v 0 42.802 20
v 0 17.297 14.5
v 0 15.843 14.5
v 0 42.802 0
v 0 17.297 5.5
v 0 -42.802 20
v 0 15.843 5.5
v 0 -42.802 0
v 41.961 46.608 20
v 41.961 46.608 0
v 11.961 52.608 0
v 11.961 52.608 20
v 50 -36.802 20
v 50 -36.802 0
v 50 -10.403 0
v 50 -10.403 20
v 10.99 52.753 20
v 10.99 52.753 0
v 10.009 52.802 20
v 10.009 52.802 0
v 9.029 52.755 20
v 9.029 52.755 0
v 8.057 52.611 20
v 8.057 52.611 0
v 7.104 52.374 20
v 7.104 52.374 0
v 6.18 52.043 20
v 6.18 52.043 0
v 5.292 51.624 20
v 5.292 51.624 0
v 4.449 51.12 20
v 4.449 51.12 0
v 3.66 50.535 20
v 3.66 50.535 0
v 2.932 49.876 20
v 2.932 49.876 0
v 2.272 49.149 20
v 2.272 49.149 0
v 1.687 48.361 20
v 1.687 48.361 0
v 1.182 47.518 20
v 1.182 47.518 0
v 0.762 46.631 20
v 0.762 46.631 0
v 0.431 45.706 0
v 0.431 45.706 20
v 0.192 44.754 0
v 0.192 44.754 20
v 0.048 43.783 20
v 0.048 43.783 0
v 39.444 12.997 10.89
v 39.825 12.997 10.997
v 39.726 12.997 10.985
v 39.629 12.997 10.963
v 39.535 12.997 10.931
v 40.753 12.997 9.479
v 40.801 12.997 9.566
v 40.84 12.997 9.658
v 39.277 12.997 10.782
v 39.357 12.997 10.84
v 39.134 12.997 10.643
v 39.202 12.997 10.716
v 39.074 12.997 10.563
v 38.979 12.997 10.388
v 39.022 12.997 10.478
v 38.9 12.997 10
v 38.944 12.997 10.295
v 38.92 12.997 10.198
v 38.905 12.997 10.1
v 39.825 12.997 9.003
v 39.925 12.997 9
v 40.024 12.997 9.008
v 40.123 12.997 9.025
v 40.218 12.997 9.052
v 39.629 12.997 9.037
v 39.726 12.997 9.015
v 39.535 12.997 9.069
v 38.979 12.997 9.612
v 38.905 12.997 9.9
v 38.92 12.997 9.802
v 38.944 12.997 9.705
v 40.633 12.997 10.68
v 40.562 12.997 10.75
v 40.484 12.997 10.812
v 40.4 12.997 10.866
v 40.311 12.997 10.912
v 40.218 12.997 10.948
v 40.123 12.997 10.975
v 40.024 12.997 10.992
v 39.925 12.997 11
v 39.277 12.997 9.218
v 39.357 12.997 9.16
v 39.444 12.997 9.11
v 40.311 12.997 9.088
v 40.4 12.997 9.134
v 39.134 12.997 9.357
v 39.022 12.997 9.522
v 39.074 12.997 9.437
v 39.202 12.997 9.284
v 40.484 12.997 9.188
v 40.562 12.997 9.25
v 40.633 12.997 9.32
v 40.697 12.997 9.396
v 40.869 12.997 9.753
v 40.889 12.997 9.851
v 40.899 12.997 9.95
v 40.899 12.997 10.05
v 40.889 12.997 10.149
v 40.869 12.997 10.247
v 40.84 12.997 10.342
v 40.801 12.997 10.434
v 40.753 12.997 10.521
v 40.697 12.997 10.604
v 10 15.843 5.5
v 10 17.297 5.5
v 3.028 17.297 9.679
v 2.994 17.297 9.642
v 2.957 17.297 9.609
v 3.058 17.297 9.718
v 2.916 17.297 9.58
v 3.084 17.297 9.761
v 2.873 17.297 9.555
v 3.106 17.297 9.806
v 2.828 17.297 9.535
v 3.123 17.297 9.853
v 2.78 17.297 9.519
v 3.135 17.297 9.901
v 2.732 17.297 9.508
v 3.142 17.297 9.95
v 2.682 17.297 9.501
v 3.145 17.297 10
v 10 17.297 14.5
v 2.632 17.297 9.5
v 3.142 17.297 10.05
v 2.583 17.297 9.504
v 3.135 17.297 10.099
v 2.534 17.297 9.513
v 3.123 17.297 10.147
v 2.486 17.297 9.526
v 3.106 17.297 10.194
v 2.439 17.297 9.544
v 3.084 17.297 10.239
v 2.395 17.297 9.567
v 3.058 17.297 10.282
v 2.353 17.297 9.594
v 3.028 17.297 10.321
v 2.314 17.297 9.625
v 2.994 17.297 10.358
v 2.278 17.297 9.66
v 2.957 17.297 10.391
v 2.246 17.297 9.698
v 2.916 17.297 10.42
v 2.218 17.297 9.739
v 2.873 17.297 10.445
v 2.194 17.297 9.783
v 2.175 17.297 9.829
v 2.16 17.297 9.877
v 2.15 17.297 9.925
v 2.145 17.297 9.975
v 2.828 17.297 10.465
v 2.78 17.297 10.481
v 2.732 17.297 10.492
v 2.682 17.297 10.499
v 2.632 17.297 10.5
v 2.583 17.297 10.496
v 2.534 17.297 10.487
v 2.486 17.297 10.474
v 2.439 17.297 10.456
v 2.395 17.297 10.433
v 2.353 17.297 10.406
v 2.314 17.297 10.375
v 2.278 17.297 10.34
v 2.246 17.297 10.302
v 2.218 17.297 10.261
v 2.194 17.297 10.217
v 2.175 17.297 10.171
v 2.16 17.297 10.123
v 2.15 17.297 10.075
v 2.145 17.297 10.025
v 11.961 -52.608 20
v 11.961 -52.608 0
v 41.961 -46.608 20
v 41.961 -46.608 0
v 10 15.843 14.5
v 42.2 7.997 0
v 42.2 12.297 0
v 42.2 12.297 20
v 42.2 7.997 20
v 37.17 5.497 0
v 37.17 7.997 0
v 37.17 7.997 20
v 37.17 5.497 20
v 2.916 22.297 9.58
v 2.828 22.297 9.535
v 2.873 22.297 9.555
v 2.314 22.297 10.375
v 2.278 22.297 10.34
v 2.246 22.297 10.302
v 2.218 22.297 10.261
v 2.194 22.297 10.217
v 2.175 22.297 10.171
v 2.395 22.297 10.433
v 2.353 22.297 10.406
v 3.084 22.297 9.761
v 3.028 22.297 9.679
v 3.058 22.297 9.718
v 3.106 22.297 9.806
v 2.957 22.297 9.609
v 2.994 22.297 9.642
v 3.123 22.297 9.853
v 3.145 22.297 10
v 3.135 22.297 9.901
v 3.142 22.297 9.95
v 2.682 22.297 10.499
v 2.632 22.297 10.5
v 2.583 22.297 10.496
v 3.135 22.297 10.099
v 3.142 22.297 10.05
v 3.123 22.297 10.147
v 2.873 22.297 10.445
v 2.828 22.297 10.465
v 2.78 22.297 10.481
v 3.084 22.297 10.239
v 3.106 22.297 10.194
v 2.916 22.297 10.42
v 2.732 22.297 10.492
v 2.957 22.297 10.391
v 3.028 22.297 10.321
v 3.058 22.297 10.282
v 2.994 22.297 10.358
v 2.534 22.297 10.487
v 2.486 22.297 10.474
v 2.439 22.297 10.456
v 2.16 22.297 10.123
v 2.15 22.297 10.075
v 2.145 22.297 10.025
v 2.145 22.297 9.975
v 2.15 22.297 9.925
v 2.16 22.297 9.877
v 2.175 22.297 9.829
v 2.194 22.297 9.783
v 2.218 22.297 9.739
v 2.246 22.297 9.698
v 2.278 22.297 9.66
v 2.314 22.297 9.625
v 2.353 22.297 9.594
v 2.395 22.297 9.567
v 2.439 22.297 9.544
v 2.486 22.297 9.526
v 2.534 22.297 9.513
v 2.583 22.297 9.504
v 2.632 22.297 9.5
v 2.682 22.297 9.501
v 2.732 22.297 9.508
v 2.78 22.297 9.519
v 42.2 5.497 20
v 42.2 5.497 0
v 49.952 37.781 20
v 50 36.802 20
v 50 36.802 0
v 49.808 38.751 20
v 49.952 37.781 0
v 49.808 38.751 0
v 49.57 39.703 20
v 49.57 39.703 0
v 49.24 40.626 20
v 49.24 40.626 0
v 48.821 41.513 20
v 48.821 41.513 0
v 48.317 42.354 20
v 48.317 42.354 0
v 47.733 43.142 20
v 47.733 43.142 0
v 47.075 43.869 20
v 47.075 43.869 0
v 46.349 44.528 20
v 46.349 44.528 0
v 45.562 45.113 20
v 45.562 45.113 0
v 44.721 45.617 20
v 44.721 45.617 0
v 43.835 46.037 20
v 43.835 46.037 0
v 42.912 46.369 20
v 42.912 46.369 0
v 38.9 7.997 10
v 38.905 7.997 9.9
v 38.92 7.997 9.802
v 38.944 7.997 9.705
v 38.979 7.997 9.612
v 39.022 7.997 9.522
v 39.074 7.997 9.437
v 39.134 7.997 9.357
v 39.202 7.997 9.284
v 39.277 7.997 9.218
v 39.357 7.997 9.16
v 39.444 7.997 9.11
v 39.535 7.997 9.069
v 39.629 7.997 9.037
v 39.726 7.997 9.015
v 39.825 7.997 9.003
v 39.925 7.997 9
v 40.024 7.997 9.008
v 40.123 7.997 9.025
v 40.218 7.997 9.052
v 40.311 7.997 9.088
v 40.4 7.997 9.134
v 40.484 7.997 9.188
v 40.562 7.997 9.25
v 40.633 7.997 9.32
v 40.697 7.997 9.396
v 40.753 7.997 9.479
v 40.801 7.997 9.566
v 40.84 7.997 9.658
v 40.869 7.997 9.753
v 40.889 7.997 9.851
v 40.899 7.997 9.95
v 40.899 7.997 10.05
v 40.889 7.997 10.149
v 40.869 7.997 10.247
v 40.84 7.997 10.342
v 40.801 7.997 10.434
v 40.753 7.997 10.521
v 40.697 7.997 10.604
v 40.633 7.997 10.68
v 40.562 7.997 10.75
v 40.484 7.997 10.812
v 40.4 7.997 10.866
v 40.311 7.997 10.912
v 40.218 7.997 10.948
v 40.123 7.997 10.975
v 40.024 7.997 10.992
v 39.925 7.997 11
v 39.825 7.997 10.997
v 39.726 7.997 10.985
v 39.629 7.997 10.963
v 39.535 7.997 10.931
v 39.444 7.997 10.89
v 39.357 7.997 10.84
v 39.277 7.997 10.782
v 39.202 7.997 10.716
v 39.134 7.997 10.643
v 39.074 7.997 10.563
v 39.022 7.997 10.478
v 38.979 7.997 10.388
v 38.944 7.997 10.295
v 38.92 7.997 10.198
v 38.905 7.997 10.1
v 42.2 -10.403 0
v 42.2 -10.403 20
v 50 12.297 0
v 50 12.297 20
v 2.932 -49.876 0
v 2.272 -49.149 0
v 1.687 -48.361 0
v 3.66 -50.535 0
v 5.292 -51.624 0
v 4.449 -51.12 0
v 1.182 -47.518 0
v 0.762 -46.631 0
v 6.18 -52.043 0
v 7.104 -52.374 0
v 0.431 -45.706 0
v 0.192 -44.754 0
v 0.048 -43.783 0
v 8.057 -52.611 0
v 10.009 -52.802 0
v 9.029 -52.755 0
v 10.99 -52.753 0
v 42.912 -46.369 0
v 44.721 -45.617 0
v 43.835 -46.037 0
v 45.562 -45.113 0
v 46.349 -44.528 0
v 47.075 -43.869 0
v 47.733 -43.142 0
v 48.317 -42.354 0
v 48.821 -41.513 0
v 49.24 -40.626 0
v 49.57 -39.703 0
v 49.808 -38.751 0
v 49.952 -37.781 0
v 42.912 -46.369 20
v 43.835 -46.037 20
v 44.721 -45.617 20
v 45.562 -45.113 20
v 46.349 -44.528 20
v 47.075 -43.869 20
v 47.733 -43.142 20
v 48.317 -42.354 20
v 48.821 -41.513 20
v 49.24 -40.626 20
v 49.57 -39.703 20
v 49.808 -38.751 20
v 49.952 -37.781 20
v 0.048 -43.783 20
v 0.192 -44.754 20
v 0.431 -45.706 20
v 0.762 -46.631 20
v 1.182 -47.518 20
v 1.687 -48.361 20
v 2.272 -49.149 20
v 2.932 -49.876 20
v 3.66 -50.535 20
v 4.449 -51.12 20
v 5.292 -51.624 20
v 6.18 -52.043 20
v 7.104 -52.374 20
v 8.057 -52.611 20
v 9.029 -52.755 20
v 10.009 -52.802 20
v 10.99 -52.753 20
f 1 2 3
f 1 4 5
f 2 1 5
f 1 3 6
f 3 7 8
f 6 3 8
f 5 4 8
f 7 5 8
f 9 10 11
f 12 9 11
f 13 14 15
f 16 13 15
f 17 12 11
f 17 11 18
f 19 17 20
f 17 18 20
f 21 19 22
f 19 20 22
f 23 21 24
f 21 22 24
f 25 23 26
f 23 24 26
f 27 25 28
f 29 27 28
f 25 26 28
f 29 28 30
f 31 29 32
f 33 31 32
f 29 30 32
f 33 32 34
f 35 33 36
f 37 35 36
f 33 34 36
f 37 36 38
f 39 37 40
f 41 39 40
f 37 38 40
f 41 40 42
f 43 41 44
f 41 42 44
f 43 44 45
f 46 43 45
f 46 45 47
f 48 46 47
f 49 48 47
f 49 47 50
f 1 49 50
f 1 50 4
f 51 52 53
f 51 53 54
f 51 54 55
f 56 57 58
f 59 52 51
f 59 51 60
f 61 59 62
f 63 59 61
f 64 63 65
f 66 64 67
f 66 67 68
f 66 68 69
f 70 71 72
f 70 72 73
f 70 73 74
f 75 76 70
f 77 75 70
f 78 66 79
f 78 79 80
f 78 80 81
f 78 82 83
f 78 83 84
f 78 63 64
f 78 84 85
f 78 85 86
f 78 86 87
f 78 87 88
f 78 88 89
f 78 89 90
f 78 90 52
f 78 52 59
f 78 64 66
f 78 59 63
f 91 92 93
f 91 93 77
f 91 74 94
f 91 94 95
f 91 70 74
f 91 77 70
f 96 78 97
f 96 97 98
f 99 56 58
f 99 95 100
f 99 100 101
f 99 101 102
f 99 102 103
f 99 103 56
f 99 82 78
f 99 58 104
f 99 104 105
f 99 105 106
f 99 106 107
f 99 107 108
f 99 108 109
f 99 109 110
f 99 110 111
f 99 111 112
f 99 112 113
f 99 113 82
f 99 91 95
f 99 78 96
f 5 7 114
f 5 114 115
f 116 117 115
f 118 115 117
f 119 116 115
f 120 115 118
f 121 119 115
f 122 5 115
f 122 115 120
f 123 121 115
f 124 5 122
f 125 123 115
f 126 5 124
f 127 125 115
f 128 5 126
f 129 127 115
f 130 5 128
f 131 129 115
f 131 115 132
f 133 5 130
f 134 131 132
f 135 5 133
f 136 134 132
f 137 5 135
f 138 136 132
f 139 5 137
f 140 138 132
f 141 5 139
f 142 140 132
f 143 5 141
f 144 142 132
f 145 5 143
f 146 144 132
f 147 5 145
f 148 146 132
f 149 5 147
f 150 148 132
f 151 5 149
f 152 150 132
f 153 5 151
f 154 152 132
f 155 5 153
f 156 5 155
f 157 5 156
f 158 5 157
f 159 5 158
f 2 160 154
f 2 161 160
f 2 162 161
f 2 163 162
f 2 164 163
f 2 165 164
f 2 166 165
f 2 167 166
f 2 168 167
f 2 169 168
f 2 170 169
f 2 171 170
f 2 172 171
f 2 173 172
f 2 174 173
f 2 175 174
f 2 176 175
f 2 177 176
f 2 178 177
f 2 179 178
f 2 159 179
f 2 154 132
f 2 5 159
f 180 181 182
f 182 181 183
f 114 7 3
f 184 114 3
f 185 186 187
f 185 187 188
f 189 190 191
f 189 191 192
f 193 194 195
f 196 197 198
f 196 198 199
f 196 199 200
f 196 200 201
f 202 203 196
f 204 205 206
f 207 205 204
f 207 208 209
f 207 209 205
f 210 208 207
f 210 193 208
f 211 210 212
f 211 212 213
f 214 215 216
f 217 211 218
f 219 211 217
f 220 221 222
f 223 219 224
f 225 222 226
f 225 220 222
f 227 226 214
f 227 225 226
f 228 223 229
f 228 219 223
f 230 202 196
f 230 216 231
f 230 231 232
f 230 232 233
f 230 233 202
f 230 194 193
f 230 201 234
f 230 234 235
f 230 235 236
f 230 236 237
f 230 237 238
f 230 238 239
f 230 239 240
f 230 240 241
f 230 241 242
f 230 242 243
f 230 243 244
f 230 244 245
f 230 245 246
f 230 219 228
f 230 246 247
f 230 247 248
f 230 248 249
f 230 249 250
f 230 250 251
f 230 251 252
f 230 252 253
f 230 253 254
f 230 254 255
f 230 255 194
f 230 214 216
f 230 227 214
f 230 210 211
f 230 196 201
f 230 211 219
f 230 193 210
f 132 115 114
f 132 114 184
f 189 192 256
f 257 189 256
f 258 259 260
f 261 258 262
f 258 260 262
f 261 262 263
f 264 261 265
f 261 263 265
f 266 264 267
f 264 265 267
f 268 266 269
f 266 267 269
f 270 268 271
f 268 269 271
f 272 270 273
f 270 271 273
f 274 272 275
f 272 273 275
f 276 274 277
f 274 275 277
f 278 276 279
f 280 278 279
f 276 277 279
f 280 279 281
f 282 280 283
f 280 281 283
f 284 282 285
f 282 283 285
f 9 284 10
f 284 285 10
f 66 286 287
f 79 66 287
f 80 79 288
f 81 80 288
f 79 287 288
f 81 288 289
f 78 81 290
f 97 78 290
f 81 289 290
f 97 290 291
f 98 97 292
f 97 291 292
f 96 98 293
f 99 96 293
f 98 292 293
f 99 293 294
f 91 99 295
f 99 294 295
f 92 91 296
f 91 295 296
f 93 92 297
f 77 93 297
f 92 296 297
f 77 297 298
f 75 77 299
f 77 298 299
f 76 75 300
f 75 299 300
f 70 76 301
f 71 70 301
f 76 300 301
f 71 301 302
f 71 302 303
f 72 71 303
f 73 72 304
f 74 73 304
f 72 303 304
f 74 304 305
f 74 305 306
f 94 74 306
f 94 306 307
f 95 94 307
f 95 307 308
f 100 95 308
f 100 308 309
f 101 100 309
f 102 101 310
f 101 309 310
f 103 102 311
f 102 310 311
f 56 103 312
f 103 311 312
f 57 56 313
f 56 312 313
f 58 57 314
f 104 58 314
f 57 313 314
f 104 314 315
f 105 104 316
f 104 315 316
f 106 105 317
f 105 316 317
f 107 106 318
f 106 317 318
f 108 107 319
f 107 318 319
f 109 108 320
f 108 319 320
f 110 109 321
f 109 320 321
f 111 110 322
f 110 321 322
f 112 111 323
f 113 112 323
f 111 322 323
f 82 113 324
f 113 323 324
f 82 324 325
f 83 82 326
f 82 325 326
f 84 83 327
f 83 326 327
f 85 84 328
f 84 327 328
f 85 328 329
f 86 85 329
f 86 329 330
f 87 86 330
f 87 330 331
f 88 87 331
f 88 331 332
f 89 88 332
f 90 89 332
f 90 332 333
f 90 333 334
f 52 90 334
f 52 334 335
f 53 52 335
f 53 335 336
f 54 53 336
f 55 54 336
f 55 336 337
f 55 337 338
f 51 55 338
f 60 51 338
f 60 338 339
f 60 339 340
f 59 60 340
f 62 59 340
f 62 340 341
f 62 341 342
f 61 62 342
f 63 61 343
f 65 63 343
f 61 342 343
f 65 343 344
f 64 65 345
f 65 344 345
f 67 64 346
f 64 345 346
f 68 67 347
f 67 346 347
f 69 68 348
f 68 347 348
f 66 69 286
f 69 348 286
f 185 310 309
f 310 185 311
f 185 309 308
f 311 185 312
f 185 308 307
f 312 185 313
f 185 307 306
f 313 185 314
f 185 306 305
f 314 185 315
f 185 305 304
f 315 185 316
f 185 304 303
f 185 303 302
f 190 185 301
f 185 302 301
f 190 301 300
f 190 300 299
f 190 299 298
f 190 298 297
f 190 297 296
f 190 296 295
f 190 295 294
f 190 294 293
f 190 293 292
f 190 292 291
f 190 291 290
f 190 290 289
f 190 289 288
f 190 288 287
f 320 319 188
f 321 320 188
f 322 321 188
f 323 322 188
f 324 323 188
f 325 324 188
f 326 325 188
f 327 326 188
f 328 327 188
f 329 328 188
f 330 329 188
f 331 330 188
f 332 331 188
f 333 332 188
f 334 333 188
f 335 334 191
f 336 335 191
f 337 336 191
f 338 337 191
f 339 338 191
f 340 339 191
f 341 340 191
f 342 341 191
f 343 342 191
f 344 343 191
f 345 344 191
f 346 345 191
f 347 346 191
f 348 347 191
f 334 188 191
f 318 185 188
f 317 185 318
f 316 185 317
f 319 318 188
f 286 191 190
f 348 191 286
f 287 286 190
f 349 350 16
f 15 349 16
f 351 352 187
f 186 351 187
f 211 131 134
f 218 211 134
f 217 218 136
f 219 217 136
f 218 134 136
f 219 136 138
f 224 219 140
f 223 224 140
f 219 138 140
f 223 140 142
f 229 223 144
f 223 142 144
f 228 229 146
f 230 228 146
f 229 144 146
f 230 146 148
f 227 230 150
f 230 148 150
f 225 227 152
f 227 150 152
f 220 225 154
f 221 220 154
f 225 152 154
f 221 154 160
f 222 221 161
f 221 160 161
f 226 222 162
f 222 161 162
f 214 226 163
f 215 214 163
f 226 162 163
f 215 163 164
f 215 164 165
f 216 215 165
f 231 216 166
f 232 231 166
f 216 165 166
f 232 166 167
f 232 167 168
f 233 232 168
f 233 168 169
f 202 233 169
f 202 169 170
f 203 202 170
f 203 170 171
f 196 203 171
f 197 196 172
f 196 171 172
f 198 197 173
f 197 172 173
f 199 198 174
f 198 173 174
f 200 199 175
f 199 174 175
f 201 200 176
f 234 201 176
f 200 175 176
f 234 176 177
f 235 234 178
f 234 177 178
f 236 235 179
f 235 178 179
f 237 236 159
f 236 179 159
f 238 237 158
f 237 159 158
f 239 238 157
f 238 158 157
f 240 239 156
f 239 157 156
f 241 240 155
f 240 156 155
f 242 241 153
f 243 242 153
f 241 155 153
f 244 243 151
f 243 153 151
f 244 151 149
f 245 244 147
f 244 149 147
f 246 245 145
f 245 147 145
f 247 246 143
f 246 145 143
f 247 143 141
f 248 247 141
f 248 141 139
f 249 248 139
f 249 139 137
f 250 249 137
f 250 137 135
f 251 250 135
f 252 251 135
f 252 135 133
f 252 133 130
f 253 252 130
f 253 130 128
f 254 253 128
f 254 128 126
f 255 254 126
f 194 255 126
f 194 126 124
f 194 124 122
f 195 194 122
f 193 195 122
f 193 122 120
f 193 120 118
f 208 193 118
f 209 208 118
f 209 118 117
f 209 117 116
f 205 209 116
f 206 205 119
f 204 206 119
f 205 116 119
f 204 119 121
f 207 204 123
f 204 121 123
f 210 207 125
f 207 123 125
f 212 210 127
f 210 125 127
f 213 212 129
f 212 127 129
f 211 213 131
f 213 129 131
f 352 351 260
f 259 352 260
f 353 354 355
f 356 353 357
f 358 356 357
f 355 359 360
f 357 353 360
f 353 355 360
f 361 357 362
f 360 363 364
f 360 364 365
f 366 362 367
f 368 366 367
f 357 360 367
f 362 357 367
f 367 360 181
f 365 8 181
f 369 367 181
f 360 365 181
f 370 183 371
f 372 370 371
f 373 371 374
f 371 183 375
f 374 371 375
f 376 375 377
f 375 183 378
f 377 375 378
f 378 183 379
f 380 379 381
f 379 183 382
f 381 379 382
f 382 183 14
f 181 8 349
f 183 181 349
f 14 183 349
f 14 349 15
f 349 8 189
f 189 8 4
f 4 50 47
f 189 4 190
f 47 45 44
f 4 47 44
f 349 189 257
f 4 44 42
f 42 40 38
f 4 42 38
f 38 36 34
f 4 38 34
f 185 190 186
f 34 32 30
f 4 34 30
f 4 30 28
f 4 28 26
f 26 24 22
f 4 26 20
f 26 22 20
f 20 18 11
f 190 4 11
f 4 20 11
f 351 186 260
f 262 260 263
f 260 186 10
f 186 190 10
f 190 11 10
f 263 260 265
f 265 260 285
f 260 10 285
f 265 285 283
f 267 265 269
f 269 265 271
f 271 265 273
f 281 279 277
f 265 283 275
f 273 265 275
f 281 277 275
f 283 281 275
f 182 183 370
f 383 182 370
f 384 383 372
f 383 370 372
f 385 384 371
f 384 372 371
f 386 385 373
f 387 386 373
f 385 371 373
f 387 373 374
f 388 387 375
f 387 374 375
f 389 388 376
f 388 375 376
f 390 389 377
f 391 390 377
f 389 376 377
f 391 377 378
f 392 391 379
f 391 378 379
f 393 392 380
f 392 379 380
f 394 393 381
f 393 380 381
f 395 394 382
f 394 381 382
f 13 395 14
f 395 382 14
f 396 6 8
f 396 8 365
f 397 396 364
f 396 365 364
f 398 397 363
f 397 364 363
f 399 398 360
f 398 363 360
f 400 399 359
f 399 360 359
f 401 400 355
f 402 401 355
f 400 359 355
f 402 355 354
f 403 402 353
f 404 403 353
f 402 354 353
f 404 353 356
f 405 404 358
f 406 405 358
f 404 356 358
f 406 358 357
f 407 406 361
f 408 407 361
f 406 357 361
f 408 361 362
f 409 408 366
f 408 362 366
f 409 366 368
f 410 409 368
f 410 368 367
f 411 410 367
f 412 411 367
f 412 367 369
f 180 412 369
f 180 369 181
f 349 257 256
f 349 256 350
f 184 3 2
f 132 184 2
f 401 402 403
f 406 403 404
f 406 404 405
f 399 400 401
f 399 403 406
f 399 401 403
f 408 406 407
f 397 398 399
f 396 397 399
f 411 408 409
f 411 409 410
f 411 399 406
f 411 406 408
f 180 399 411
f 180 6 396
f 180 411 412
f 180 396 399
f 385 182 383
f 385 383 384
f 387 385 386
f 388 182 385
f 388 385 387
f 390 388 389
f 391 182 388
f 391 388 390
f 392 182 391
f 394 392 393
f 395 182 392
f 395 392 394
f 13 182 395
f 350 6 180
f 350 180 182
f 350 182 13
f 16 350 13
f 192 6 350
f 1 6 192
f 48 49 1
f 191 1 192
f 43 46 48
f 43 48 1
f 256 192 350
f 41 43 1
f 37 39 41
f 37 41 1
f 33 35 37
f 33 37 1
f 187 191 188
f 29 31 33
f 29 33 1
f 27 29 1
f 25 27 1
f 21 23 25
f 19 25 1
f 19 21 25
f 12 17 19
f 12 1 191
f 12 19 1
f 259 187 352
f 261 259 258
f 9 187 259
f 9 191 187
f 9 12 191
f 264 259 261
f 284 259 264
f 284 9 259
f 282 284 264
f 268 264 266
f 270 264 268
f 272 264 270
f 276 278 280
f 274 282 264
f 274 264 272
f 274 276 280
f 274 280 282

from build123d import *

# Parameters (mm, degrees)
BOSS_EXTRUDE1_DEPTH = 20
SKETCH5_W           = 9
SKETCH5_H           = 1.454272164
CUT_EXTRUDE4_DEPTH  = 10
SKETCH6_R           = 0.5
CUT_EXTRUDE5_DEPTH  = 5
CUT_EXTRUDE6_DEPTH  = 21
SKETCH11_R          = 1
CUT_EXTRUDE7_DEPTH  = 5


with BuildPart() as part:
    # Sketch1 → Boss-Extrude1 (new body)
    with BuildSketch(Plane.XY):
        with BuildLine():
            Line((0, 42.801960973), (0, -42.801960973))
            ThreePointArc((0, -42.801960973), (3.660110944, -50.535382386), (11.961161351, -52.60776773))
            Line((11.961161351, -52.60776773), (41.961161351, -46.60776773))
            ThreePointArc((41.961161351, -46.60776773), (47.733421413, -43.141850029), (50, -36.801960973))
            Line((50, -36.801960973), (50, 36.801960973))
            ThreePointArc((50, 36.801960973), (47.733421413, 43.141850029), (41.961161351, 46.60776773))
            Line((41.961161351, 46.60776773), (11.961161351, 52.60776773))
            ThreePointArc((11.961161351, 52.60776773), (3.660110944, 50.535382386), (0, 42.801960973))
        make_face()
    extrude(amount=BOSS_EXTRUDE1_DEPTH)

    # Sketch5 → Cut-Extrude4 (cut)
    with BuildSketch(Plane.ZY):
        with Locations((10, 16.569972364)):
            Rectangle(SKETCH5_W, SKETCH5_H)
    extrude(amount=-CUT_EXTRUDE4_DEPTH, mode=Mode.SUBTRACT)

    # Sketch6 → Cut-Extrude5 (cut)
    with BuildSketch(Plane.XZ.offset(-17.297108446)):
        with Locations((2.644871575, 10)):
            Circle(SKETCH6_R)
    extrude(amount=-CUT_EXTRUDE5_DEPTH, mode=Mode.SUBTRACT)

    # Sketch9 → Cut-Extrude6 (cut, through all)
    with BuildSketch(Plane.XY.offset(20)):
        Polygon((42.2, 5.497108446), (42.2, -10.402891554), (50, -10.402891554), (50, 12.297108446), (42.2, 12.297108446), (42.2, 7.997108446), (37.17, 7.997108446), (37.17, 5.497108446), align=None)
    extrude(amount=-CUT_EXTRUDE6_DEPTH, mode=Mode.SUBTRACT)

    # Sketch11 → Cut-Extrude7 (cut)
    with BuildSketch(Plane(origin=(0, 7.997108446, 0), x_dir=(-1, 0, 0), z_dir=(0, -1, 0))):
        with Locations((-39.9, -10)):
            Circle(SKETCH11_R)
    extrude(amount=-CUT_EXTRUDE7_DEPTH, mode=Mode.SUBTRACT)


solid = part.part
